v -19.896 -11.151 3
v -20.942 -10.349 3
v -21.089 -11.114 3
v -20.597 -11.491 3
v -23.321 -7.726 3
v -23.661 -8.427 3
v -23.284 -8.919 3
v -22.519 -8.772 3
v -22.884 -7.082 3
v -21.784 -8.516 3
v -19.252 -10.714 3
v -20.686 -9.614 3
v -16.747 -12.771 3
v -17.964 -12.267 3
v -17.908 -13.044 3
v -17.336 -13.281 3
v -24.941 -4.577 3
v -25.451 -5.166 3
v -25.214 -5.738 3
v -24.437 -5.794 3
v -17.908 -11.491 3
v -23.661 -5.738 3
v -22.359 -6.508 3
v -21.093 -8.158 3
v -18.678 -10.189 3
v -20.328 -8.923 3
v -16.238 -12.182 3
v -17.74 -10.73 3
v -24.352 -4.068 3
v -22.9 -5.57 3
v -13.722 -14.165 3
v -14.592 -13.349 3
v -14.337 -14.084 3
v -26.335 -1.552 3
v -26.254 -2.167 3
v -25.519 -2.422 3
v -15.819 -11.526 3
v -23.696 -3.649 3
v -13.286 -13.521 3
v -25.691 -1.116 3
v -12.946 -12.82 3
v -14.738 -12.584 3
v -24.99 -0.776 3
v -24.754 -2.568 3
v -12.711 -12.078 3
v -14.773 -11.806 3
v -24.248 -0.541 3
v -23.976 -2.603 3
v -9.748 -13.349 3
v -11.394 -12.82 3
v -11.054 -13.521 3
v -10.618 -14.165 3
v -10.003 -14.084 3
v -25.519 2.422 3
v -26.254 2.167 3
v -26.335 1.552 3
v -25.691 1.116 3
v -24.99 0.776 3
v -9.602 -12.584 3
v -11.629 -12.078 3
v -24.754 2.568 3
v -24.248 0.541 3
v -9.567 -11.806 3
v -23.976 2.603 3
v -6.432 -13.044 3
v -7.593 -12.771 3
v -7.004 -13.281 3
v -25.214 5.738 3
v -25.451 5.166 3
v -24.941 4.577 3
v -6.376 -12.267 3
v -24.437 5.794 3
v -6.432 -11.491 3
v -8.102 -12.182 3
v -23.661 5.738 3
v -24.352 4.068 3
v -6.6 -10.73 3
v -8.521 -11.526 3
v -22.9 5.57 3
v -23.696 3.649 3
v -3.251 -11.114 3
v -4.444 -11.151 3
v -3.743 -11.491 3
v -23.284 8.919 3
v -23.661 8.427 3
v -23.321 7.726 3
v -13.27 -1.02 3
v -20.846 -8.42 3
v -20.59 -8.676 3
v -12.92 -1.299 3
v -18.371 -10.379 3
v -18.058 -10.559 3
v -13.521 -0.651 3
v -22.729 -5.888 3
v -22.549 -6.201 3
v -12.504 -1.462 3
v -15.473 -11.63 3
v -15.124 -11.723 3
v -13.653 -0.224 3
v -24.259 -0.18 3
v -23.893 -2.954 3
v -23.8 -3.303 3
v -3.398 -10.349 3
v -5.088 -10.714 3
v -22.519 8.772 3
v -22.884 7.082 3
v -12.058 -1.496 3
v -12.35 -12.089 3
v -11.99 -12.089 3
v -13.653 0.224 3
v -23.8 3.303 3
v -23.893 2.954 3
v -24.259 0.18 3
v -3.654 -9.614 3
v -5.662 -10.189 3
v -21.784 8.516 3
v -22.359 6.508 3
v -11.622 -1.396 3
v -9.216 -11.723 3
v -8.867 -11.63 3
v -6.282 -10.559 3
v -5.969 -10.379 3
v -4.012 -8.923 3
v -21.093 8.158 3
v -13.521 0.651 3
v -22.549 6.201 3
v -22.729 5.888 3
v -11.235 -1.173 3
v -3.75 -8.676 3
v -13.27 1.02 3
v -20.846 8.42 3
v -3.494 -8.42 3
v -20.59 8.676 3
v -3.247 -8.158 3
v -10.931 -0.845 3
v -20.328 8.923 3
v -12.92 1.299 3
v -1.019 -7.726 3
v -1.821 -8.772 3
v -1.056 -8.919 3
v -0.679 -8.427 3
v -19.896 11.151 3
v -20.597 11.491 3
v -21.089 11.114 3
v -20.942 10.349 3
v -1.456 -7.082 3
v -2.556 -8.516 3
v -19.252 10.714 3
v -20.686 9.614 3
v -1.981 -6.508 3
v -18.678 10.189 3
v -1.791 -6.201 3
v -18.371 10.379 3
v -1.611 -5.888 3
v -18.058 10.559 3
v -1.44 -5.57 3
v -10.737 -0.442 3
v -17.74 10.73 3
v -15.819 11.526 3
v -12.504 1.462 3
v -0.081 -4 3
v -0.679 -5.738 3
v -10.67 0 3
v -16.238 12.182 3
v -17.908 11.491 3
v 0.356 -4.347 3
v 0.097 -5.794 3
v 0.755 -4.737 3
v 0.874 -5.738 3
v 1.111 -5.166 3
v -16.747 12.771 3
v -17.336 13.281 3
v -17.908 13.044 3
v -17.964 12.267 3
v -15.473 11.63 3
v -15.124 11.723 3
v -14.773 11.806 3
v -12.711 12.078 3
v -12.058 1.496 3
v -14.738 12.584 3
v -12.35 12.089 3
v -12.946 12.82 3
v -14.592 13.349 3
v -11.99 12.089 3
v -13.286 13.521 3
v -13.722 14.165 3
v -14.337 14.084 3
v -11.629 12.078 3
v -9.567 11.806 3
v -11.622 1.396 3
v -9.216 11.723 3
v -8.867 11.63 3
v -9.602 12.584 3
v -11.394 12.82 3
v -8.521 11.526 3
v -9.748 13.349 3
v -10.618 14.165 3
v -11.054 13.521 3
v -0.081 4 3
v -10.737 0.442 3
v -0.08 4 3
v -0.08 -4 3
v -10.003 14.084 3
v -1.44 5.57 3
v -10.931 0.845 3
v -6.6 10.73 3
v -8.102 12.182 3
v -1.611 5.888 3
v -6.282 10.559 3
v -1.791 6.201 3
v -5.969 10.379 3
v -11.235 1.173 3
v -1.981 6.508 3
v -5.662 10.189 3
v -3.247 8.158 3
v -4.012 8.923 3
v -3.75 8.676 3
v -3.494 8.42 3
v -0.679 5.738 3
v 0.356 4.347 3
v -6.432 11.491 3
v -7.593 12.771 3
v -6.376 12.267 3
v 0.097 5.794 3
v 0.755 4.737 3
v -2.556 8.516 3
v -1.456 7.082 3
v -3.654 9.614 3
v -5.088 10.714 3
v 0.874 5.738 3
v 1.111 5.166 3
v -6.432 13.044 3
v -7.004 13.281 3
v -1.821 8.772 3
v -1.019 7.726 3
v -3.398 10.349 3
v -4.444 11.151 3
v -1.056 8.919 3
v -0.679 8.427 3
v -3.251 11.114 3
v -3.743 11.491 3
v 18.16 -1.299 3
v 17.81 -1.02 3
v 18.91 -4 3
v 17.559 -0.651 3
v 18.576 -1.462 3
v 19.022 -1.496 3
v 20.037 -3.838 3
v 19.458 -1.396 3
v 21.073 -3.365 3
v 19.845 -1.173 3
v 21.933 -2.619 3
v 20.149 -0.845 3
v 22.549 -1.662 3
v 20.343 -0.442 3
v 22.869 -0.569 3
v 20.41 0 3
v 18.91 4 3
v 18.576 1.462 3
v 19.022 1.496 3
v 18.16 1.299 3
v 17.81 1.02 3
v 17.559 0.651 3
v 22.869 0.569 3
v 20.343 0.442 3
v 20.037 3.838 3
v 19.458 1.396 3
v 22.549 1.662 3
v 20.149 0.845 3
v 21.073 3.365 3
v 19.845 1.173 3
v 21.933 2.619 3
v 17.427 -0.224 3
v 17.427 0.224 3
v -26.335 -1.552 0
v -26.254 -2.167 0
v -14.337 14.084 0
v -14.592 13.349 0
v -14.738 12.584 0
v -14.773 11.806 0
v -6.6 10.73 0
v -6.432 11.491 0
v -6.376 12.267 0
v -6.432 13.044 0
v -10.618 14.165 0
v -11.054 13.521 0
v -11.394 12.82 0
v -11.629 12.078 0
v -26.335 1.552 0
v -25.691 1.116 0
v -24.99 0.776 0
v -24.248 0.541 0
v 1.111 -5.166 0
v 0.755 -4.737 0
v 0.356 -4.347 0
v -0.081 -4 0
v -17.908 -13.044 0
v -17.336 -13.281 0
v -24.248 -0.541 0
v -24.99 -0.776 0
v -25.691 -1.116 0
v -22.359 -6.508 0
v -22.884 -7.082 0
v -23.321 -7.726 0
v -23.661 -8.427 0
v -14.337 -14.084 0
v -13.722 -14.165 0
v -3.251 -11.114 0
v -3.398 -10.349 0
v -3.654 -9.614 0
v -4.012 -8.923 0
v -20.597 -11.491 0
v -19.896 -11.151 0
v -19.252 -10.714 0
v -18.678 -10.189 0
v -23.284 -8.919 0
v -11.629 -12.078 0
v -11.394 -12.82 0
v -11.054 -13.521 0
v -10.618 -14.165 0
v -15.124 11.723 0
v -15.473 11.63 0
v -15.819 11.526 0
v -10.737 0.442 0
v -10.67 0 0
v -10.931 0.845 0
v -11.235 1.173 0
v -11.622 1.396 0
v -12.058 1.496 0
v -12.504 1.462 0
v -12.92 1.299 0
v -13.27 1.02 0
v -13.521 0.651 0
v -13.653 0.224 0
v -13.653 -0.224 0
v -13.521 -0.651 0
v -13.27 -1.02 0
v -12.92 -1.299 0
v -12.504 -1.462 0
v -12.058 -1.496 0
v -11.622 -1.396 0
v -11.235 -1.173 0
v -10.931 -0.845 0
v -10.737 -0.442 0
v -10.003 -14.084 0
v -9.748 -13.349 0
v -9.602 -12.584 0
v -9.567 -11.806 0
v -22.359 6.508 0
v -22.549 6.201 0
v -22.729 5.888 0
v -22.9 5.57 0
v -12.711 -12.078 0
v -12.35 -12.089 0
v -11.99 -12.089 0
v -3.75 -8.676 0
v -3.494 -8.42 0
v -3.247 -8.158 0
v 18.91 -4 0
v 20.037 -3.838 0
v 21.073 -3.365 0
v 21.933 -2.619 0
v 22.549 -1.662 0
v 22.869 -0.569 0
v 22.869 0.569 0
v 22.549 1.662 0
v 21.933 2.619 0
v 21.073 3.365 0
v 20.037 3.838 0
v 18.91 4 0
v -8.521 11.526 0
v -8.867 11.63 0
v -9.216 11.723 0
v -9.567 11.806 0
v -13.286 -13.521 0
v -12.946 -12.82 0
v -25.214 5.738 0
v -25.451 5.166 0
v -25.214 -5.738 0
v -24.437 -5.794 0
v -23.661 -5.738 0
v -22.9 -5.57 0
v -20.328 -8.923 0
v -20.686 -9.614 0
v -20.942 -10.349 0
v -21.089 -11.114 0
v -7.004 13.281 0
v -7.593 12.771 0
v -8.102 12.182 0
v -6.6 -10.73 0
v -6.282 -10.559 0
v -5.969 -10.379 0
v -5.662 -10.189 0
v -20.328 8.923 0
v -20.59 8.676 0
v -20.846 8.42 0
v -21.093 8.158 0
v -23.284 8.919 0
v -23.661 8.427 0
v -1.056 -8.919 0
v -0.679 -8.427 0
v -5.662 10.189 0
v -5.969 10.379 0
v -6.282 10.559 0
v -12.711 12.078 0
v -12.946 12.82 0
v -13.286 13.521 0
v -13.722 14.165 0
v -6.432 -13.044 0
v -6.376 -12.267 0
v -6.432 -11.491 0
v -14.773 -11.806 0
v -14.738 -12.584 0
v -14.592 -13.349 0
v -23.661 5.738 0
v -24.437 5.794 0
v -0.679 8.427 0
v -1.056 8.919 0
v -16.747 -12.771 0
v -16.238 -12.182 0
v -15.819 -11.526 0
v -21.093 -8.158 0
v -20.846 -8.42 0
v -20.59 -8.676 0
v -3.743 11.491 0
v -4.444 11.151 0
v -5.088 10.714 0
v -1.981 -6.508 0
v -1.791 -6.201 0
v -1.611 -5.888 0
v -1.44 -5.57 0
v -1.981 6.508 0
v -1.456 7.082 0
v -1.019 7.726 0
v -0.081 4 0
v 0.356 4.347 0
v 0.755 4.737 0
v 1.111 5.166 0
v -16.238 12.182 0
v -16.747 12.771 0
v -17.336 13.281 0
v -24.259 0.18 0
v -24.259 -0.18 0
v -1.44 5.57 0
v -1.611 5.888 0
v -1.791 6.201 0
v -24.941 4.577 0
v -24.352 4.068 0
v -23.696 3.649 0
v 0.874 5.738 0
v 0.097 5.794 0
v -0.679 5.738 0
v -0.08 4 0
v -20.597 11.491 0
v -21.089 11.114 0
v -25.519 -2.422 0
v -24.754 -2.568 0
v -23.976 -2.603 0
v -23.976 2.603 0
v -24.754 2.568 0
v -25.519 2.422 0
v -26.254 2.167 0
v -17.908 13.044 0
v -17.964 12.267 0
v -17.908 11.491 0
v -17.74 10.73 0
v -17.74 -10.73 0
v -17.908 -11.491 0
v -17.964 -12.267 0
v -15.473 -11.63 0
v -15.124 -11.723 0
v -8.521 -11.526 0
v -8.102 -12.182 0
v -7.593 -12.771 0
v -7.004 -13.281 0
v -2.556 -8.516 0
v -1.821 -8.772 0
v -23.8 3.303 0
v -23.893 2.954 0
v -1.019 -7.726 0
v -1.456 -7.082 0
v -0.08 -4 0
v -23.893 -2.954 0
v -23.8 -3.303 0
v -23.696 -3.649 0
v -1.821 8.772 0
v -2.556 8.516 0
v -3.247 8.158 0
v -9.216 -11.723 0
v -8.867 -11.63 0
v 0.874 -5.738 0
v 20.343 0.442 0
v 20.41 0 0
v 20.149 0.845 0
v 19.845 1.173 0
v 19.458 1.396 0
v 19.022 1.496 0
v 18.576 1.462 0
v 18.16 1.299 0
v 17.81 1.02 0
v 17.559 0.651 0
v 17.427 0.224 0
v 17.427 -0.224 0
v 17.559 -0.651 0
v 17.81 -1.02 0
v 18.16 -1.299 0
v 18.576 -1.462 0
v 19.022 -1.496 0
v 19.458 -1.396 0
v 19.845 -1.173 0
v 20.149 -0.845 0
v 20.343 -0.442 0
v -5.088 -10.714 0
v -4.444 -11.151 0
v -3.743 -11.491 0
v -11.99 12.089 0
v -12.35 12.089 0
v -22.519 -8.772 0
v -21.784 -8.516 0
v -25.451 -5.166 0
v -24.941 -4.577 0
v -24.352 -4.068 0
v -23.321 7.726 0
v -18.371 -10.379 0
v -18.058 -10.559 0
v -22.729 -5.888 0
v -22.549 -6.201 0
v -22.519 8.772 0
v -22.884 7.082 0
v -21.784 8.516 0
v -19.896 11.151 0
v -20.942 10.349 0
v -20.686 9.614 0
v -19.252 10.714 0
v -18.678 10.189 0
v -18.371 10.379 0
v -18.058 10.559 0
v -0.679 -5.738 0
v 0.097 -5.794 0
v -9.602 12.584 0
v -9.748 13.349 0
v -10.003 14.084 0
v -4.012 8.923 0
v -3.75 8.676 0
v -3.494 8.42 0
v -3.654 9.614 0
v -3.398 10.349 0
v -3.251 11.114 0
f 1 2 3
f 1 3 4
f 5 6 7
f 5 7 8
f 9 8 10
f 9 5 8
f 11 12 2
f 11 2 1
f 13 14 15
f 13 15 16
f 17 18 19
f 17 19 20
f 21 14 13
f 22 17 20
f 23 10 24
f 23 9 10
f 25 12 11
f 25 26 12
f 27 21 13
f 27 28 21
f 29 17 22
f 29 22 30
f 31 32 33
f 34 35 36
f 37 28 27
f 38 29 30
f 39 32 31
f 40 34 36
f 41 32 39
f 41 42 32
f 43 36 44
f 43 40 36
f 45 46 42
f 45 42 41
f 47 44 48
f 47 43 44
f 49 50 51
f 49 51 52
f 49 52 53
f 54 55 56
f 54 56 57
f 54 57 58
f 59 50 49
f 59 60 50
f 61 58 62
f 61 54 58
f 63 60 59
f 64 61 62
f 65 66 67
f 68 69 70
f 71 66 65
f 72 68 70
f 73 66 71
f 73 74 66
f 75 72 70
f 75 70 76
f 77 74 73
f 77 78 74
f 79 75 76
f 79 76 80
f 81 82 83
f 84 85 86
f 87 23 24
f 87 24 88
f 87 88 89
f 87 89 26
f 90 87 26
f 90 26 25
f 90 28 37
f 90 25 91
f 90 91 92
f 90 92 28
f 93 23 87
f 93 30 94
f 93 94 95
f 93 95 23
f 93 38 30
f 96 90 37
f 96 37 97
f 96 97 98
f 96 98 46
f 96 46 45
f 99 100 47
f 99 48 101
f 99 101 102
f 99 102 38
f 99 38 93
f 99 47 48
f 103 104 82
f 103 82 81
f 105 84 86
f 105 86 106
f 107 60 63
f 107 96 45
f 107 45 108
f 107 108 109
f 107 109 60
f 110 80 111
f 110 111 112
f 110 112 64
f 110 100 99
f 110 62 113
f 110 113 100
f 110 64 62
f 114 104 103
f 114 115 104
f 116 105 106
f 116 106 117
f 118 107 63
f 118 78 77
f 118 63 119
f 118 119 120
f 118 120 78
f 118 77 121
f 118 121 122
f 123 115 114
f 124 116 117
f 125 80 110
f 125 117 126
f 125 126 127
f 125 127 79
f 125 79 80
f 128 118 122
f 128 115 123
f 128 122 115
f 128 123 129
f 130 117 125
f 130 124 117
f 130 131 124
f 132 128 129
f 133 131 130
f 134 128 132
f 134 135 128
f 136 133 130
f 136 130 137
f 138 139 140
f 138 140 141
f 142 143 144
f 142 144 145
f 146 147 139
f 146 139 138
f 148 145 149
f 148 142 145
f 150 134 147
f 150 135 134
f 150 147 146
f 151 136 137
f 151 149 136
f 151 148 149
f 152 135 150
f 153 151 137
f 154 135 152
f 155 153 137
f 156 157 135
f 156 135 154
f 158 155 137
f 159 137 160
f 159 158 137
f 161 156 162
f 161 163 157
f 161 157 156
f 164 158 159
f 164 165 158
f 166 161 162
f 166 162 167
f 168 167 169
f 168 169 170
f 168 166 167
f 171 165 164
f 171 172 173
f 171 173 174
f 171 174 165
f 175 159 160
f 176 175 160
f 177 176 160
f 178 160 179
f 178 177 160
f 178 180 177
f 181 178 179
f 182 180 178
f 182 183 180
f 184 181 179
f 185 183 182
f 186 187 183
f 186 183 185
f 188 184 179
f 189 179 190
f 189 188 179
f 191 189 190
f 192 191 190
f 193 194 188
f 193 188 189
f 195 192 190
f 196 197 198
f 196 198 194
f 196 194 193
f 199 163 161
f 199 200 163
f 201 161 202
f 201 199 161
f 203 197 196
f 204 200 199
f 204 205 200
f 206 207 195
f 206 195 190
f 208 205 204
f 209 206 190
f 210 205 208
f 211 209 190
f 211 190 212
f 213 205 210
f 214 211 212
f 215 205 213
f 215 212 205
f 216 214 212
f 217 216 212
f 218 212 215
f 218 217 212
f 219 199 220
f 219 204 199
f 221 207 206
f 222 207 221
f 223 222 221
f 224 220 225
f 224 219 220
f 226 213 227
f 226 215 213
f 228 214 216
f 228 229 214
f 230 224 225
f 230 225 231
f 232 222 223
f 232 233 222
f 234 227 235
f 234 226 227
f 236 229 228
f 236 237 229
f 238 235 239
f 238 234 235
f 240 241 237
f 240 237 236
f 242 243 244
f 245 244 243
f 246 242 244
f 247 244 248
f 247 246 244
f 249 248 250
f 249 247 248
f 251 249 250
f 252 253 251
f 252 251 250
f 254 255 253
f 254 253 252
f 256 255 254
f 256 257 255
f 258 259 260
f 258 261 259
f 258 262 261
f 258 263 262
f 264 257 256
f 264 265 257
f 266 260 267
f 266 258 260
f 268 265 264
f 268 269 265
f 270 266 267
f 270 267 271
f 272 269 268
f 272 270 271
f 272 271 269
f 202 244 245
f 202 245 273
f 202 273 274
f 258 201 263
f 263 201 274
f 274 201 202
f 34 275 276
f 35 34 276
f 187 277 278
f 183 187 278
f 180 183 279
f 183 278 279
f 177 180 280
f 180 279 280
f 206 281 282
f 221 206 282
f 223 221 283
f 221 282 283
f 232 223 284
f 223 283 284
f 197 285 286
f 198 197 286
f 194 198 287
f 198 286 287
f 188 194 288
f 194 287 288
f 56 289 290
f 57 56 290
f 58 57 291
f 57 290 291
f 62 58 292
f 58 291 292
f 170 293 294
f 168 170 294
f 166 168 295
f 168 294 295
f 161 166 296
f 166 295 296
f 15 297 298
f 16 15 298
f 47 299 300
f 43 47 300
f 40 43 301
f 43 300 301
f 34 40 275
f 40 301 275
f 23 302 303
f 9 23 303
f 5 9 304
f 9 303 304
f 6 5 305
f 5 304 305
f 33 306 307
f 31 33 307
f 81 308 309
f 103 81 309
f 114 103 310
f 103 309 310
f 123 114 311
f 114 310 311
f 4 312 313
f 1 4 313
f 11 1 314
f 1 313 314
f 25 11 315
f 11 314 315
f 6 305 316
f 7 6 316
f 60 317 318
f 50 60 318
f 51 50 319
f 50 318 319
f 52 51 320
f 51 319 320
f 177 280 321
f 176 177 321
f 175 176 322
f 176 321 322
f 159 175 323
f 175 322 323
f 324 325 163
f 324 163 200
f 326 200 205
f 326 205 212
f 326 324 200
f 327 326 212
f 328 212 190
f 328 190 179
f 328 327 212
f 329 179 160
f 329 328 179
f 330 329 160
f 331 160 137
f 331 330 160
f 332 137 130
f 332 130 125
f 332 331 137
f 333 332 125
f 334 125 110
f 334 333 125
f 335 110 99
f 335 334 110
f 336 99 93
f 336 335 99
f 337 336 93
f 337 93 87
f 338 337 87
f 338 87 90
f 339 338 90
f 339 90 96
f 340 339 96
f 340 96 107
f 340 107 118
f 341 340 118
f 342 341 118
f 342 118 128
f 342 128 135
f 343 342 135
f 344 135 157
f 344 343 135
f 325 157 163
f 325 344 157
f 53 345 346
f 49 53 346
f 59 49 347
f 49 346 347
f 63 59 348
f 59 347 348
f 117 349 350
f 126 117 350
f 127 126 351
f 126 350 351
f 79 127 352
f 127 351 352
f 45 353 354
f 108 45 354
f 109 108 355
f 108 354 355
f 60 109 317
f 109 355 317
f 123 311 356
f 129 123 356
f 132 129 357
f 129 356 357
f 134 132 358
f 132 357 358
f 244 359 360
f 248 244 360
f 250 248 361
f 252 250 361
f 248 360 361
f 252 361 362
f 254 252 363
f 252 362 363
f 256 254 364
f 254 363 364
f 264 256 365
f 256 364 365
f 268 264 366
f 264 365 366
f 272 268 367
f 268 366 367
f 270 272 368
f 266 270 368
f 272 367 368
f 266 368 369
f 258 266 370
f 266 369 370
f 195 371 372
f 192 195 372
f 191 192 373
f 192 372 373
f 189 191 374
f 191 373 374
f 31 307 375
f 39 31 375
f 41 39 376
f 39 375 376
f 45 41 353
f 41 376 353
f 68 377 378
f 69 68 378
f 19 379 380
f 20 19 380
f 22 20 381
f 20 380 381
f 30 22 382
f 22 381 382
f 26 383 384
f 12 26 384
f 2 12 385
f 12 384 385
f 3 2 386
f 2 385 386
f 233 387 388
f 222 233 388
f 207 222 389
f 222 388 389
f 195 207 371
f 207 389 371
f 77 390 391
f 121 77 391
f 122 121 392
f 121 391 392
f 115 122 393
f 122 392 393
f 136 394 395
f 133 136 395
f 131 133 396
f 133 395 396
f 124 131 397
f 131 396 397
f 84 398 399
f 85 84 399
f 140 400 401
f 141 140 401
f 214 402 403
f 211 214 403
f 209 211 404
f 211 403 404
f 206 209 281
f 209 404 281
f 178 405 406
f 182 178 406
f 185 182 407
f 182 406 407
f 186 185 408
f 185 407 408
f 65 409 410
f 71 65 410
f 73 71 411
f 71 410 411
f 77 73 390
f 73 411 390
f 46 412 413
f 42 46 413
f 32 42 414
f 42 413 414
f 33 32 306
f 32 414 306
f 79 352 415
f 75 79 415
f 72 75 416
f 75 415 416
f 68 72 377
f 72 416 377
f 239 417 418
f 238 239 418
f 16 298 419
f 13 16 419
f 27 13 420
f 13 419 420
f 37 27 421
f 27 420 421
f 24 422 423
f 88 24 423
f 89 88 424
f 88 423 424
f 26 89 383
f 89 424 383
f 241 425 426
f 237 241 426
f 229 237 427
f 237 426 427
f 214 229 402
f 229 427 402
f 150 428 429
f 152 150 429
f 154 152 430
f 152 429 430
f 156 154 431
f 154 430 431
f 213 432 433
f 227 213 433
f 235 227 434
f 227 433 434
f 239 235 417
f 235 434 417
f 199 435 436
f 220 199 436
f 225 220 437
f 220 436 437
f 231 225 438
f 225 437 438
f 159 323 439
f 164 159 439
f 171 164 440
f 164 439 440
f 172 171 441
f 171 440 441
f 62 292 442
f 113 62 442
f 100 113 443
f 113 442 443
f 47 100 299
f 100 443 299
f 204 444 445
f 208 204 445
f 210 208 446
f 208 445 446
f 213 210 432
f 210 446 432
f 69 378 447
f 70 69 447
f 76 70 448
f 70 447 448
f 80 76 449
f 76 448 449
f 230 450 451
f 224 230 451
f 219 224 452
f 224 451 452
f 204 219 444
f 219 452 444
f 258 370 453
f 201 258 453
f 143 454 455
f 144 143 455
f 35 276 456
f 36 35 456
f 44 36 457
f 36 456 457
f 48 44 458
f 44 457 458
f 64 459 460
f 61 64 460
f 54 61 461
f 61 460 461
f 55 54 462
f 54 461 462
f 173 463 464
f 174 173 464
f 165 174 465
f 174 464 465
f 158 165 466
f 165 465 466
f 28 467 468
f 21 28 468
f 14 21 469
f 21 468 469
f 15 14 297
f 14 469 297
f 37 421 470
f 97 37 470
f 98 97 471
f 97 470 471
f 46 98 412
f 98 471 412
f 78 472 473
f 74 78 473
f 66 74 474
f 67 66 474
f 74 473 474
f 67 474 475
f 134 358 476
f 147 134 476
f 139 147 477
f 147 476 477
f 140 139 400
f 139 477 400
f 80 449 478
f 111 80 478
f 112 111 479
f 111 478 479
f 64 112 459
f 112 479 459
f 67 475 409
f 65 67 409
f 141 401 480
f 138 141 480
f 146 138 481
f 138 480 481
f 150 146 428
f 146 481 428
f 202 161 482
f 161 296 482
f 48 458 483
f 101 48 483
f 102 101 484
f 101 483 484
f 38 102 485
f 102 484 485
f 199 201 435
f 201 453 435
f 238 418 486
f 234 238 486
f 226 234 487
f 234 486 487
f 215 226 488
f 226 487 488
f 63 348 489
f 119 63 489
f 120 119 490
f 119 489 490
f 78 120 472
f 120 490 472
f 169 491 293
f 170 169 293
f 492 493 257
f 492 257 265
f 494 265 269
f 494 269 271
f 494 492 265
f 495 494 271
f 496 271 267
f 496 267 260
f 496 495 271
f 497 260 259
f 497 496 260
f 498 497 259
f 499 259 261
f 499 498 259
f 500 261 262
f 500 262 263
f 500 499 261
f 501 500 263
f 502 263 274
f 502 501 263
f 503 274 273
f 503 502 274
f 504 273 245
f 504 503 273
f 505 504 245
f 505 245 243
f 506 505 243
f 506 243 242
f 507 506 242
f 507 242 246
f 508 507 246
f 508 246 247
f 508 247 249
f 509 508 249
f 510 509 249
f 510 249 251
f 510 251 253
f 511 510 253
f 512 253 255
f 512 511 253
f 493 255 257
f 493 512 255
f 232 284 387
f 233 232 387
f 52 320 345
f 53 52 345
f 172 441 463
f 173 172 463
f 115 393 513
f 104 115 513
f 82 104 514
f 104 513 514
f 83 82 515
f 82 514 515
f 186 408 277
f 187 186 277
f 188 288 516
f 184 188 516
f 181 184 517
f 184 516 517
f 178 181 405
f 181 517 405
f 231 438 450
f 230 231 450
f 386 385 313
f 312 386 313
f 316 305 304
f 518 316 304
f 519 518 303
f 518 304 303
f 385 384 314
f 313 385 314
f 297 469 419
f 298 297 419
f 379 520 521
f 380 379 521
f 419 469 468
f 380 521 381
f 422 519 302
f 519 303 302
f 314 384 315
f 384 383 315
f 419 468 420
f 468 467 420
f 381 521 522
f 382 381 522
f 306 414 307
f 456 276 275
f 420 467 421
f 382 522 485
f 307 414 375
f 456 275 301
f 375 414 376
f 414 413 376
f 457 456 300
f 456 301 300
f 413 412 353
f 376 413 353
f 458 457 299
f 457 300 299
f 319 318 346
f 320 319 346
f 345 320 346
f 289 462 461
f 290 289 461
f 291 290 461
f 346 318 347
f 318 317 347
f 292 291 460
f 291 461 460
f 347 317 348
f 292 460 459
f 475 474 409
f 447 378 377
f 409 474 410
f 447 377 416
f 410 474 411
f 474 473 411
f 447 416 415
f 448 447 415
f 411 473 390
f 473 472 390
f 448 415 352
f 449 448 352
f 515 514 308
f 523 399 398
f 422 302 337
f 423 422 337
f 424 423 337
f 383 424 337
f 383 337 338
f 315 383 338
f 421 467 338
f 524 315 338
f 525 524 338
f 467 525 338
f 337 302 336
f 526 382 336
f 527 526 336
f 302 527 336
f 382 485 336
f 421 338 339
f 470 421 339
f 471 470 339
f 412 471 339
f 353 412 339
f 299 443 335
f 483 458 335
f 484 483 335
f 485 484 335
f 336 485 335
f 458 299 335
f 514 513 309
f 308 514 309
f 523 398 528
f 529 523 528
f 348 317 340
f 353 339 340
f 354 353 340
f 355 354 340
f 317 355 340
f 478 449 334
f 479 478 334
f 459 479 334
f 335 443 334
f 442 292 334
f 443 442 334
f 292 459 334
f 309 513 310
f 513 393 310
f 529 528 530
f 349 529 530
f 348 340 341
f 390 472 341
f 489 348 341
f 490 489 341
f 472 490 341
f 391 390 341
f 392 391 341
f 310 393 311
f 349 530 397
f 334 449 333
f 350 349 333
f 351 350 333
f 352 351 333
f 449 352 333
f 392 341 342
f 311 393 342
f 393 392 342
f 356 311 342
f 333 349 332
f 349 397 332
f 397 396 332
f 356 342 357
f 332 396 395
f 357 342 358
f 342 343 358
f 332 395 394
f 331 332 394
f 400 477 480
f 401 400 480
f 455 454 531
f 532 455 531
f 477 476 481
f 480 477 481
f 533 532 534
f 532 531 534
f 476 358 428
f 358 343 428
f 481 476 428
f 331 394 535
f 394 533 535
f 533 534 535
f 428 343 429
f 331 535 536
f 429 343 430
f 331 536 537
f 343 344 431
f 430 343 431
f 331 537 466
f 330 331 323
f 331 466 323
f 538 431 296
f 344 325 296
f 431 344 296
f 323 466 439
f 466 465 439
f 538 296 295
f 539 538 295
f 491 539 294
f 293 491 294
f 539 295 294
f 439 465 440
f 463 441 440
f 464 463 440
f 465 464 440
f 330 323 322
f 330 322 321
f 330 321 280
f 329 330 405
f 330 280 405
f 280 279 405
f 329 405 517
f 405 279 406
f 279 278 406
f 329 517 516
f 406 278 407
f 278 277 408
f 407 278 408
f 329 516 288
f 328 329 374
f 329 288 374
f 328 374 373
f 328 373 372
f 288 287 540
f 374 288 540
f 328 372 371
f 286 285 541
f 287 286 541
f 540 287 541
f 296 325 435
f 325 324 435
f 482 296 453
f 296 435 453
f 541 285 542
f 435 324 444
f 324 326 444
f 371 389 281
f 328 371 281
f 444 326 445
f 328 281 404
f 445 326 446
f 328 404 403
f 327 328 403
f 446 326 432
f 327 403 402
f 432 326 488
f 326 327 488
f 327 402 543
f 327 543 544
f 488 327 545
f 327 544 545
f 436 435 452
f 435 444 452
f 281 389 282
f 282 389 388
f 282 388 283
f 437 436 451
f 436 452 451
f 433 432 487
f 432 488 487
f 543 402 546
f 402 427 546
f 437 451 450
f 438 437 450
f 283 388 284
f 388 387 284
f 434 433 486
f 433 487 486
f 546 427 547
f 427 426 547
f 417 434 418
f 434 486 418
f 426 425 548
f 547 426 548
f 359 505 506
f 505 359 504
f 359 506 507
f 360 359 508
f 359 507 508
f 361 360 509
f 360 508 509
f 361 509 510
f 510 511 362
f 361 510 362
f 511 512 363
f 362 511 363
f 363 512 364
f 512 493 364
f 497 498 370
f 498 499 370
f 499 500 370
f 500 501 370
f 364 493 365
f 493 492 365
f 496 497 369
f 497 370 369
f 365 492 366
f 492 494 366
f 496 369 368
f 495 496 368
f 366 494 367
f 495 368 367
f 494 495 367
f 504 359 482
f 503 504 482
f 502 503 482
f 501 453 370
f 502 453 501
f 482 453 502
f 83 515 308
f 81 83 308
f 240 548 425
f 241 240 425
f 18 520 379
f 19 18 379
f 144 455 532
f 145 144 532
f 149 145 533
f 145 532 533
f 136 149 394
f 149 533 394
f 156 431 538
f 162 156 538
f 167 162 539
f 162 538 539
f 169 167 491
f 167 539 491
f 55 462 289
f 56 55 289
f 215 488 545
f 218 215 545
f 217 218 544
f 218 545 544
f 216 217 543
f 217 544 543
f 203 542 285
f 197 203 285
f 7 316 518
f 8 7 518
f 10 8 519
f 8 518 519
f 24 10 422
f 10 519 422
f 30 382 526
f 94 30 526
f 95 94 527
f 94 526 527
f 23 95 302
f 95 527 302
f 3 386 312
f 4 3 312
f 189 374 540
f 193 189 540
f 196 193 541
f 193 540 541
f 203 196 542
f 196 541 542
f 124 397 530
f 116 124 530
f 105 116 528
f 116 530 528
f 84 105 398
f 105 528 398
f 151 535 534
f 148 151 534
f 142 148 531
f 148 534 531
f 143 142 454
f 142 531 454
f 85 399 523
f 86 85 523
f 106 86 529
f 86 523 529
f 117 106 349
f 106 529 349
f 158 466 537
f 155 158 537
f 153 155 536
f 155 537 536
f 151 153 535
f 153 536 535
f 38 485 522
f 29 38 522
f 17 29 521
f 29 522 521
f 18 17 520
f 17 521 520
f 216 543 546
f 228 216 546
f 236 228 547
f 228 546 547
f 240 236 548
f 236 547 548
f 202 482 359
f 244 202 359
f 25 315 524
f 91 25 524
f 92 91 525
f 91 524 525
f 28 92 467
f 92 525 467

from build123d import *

# Parameters (mm, degrees)
SKETCH1_R           = 1.5
BOSS_EXTRUDE1_DEPTH = 3


with BuildPart() as part:
    # Sketch1 → Boss-Extrude1 (new body)
    with BuildSketch(Plane.XY):
        with BuildLine():
            ThreePointArc((-0.08, 4), (-0.080376511, 3.999992452), (-0.080753021, 3.999984869))
            ThreePointArc((-0.080753021, 3.999984869), (0.560266414, 4.536513248), (1.110799577, 5.165545722))
            Line((1.110799577, 5.165545722), (0.873535849, 5.738351032))
            ThreePointArc((0.873535849, 5.738351032), (-0.292204471, 5.779997685), (-1.43969018, 5.570327744))
            ThreePointArc((-1.43969018, 5.570327744), (-1.699752868, 6.045), (-1.980799756, 6.507557022))
            ThreePointArc((-1.980799756, 6.507557022), (-1.225477407, 7.396473826), (-0.678674306, 8.426857884))
            Line((-0.678674306, 8.426857884), (-1.056106392, 8.918736955))
            ThreePointArc((-1.056106392, 8.918736955), (-2.192904021, 8.657248736), (-3.247023529, 8.15773197))
            ThreePointArc((-3.247023529, 8.15773197), (-3.621079015, 8.548920985), (-4.01226803, 8.922976471))
            ThreePointArc((-4.01226803, 8.922976471), (-3.512751264, 9.977095979), (-3.251263045, 11.113893608))
            Line((-3.251263045, 11.113893608), (-3.743142116, 11.491325694))
            ThreePointArc((-3.743142116, 11.491325694), (-4.773526174, 10.944522593), (-5.662442978, 10.189200244))
            ThreePointArc((-5.662442978, 10.189200244), (-6.125, 10.470247132), (-6.599672256, 10.73030982))
            ThreePointArc((-6.599672256, 10.73030982), (-6.390002315, 11.877795529), (-6.431648968, 13.043535849))
            Line((-6.431648968, 13.043535849), (-7.004454278, 13.280799577))
            ThreePointArc((-7.004454278, 13.280799577), (-7.858205794, 12.485945322), (-8.521341684, 11.526291359))
            ThreePointArc((-8.521341684, 11.526291359), (-9.040877745, 11.67804324), (-9.566685112, 11.806390286))
            ThreePointArc((-9.566685112, 11.806390286), (-9.661150657, 12.969042942), (-10.003094031, 14.084282677))
            Line((-10.003094031, 14.084282677), (-10.617789845, 14.165208916))
            ThreePointArc((-10.617789845, 14.165208916), (-11.236727065, 13.176471511), (-11.628890424, 12.077884766))
            ThreePointArc((-11.628890424, 12.077884766), (-12.17, 12.09), (-12.711109576, 12.077884766))
            ThreePointArc((-12.711109576, 12.077884766), (-13.103272935, 13.176471511), (-13.722210155, 14.165208916))
            Line((-13.722210155, 14.165208916), (-14.336905969, 14.084282677))
            ThreePointArc((-14.336905969, 14.084282677), (-14.678849343, 12.969042942), (-14.773314888, 11.806390286))
            ThreePointArc((-14.773314888, 11.806390286), (-15.299122255, 11.67804324), (-15.818658316, 11.526291359))
            ThreePointArc((-15.818658316, 11.526291359), (-16.481794206, 12.485945322), (-17.335545722, 13.280799577))
            Line((-17.335545722, 13.280799577), (-17.908351032, 13.043535849))
            ThreePointArc((-17.908351032, 13.043535849), (-17.949997685, 11.877795529), (-17.740327744, 10.73030982))
            ThreePointArc((-17.740327744, 10.73030982), (-18.215, 10.470247132), (-18.677557022, 10.189200244))
            ThreePointArc((-18.677557022, 10.189200244), (-19.566473826, 10.944522593), (-20.596857884, 11.491325694))
            Line((-20.596857884, 11.491325694), (-21.088736955, 11.113893608))
            ThreePointArc((-21.088736955, 11.113893608), (-20.827248736, 9.977095979), (-20.32773197, 8.922976471))
            ThreePointArc((-20.32773197, 8.922976471), (-20.718920985, 8.548920985), (-21.092976471, 8.15773197))
            ThreePointArc((-21.092976471, 8.15773197), (-22.147095979, 8.657248736), (-23.283893608, 8.918736955))
            Line((-23.283893608, 8.918736955), (-23.661325694, 8.426857884))
            ThreePointArc((-23.661325694, 8.426857884), (-23.114522593, 7.396473826), (-22.359200244, 6.507557022))
            ThreePointArc((-22.359200244, 6.507557022), (-22.640247132, 6.045), (-22.90030982, 5.570327744))
            ThreePointArc((-22.90030982, 5.570327744), (-24.047795529, 5.779997685), (-25.213535849, 5.738351032))
            Line((-25.213535849, 5.738351032), (-25.450799577, 5.165545722))
            ThreePointArc((-25.450799577, 5.165545722), (-24.655945322, 4.311794206), (-23.696291359, 3.648658316))
            ThreePointArc((-23.696291359, 3.648658316), (-23.84804324, 3.129122255), (-23.976390286, 2.603314888))
            ThreePointArc((-23.976390286, 2.603314888), (-25.139042942, 2.508849343), (-26.254282677, 2.166905969))
            Line((-26.254282677, 2.166905969), (-26.335208916, 1.552210155))
            ThreePointArc((-26.335208916, 1.552210155), (-25.346471511, 0.933272935), (-24.247884766, 0.541109576))
            ThreePointArc((-24.247884766, 0.541109576), (-24.26, 0), (-24.247884766, -0.541109576))
            ThreePointArc((-24.247884766, -0.541109576), (-25.346471511, -0.933272935), (-26.335208916, -1.552210155))
            Line((-26.335208916, -1.552210155), (-26.254282677, -2.166905969))
            ThreePointArc((-26.254282677, -2.166905969), (-25.139042942, -2.508849343), (-23.976390286, -2.603314888))
            ThreePointArc((-23.976390286, -2.603314888), (-23.84804324, -3.129122255), (-23.696291359, -3.648658316))
            ThreePointArc((-23.696291359, -3.648658316), (-24.655945322, -4.311794206), (-25.450799577, -5.165545722))
            Line((-25.450799577, -5.165545722), (-25.213535849, -5.738351032))
            ThreePointArc((-25.213535849, -5.738351032), (-24.047795529, -5.779997685), (-22.90030982, -5.570327744))
            ThreePointArc((-22.90030982, -5.570327744), (-22.640247132, -6.045), (-22.359200244, -6.507557022))
            ThreePointArc((-22.359200244, -6.507557022), (-23.114522593, -7.396473826), (-23.661325694, -8.426857884))
            Line((-23.661325694, -8.426857884), (-23.283893608, -8.918736955))
            ThreePointArc((-23.283893608, -8.918736955), (-22.147095979, -8.657248736), (-21.092976471, -8.15773197))
            ThreePointArc((-21.092976471, -8.15773197), (-20.718920985, -8.548920985), (-20.32773197, -8.922976471))
            ThreePointArc((-20.32773197, -8.922976471), (-20.827248736, -9.977095979), (-21.088736955, -11.113893608))
            Line((-21.088736955, -11.113893608), (-20.596857884, -11.491325694))
            ThreePointArc((-20.596857884, -11.491325694), (-19.566473826, -10.944522593), (-18.677557022, -10.189200244))
            ThreePointArc((-18.677557022, -10.189200244), (-18.215, -10.470247132), (-17.740327744, -10.73030982))
            ThreePointArc((-17.740327744, -10.73030982), (-17.949997685, -11.877795529), (-17.908351032, -13.043535849))
            Line((-17.908351032, -13.043535849), (-17.335545722, -13.280799577))
            ThreePointArc((-17.335545722, -13.280799577), (-16.481794206, -12.485945322), (-15.818658316, -11.526291359))
            ThreePointArc((-15.818658316, -11.526291359), (-15.299122255, -11.67804324), (-14.773314888, -11.806390286))
            ThreePointArc((-14.773314888, -11.806390286), (-14.678849343, -12.969042942), (-14.336905969, -14.084282677))
            Line((-14.336905969, -14.084282677), (-13.722210155, -14.165208916))
            ThreePointArc((-13.722210155, -14.165208916), (-13.103272935, -13.176471511), (-12.711109576, -12.077884766))
            ThreePointArc((-12.711109576, -12.077884766), (-12.17, -12.09), (-11.628890424, -12.077884766))
            ThreePointArc((-11.628890424, -12.077884766), (-11.236727065, -13.176471511), (-10.617789845, -14.165208916))
            Line((-10.617789845, -14.165208916), (-10.003094031, -14.084282677))
            ThreePointArc((-10.003094031, -14.084282677), (-9.661150657, -12.969042942), (-9.566685112, -11.806390286))
            ThreePointArc((-9.566685112, -11.806390286), (-9.040877745, -11.67804324), (-8.521341684, -11.526291359))
            ThreePointArc((-8.521341684, -11.526291359), (-7.858205794, -12.485945322), (-7.004454278, -13.280799577))
            Line((-7.004454278, -13.280799577), (-6.431648968, -13.043535849))
            ThreePointArc((-6.431648968, -13.043535849), (-6.390002315, -11.877795529), (-6.599672256, -10.73030982))
            ThreePointArc((-6.599672256, -10.73030982), (-6.125, -10.470247132), (-5.662442978, -10.189200244))
            ThreePointArc((-5.662442978, -10.189200244), (-4.773526174, -10.944522593), (-3.743142116, -11.491325694))
            Line((-3.743142116, -11.491325694), (-3.251263045, -11.113893608))
            ThreePointArc((-3.251263045, -11.113893608), (-3.512751264, -9.977095979), (-4.01226803, -8.922976471))
            ThreePointArc((-4.01226803, -8.922976471), (-3.621079015, -8.548920985), (-3.247023529, -8.15773197))
            ThreePointArc((-3.247023529, -8.15773197), (-2.192904021, -8.657248736), (-1.056106392, -8.918736955))
            Line((-1.056106392, -8.918736955), (-0.678674306, -8.426857884))
            ThreePointArc((-0.678674306, -8.426857884), (-1.225477407, -7.396473826), (-1.980799756, -6.507557022))
            ThreePointArc((-1.980799756, -6.507557022), (-1.699752868, -6.045), (-1.43969018, -5.570327744))
            ThreePointArc((-1.43969018, -5.570327744), (-0.292204471, -5.779997685), (0.873535849, -5.738351032))
            Line((0.873535849, -5.738351032), (1.110799577, -5.165545722))
            ThreePointArc((1.110799577, -5.165545722), (0.560266414, -4.536513248), (-0.080753021, -3.999984869))
            ThreePointArc((-0.080753021, -3.999984869), (-0.080376511, -3.999992452), (-0.08, -4))
            Line((-0.08, -4), (18.91, -4))
            ThreePointArc((18.91, -4), (22.91, 0), (18.91, 4))
            Line((18.91, 4), (-0.08, 4))
        make_face()
        with Locations((18.91, 0)):
            Circle(SKETCH1_R, mode=Mode.SUBTRACT)
        with Locations((-12.17, 0)):
            Circle(SKETCH1_R, mode=Mode.SUBTRACT)
    extrude(amount=BOSS_EXTRUDE1_DEPTH)


solid = part.part
